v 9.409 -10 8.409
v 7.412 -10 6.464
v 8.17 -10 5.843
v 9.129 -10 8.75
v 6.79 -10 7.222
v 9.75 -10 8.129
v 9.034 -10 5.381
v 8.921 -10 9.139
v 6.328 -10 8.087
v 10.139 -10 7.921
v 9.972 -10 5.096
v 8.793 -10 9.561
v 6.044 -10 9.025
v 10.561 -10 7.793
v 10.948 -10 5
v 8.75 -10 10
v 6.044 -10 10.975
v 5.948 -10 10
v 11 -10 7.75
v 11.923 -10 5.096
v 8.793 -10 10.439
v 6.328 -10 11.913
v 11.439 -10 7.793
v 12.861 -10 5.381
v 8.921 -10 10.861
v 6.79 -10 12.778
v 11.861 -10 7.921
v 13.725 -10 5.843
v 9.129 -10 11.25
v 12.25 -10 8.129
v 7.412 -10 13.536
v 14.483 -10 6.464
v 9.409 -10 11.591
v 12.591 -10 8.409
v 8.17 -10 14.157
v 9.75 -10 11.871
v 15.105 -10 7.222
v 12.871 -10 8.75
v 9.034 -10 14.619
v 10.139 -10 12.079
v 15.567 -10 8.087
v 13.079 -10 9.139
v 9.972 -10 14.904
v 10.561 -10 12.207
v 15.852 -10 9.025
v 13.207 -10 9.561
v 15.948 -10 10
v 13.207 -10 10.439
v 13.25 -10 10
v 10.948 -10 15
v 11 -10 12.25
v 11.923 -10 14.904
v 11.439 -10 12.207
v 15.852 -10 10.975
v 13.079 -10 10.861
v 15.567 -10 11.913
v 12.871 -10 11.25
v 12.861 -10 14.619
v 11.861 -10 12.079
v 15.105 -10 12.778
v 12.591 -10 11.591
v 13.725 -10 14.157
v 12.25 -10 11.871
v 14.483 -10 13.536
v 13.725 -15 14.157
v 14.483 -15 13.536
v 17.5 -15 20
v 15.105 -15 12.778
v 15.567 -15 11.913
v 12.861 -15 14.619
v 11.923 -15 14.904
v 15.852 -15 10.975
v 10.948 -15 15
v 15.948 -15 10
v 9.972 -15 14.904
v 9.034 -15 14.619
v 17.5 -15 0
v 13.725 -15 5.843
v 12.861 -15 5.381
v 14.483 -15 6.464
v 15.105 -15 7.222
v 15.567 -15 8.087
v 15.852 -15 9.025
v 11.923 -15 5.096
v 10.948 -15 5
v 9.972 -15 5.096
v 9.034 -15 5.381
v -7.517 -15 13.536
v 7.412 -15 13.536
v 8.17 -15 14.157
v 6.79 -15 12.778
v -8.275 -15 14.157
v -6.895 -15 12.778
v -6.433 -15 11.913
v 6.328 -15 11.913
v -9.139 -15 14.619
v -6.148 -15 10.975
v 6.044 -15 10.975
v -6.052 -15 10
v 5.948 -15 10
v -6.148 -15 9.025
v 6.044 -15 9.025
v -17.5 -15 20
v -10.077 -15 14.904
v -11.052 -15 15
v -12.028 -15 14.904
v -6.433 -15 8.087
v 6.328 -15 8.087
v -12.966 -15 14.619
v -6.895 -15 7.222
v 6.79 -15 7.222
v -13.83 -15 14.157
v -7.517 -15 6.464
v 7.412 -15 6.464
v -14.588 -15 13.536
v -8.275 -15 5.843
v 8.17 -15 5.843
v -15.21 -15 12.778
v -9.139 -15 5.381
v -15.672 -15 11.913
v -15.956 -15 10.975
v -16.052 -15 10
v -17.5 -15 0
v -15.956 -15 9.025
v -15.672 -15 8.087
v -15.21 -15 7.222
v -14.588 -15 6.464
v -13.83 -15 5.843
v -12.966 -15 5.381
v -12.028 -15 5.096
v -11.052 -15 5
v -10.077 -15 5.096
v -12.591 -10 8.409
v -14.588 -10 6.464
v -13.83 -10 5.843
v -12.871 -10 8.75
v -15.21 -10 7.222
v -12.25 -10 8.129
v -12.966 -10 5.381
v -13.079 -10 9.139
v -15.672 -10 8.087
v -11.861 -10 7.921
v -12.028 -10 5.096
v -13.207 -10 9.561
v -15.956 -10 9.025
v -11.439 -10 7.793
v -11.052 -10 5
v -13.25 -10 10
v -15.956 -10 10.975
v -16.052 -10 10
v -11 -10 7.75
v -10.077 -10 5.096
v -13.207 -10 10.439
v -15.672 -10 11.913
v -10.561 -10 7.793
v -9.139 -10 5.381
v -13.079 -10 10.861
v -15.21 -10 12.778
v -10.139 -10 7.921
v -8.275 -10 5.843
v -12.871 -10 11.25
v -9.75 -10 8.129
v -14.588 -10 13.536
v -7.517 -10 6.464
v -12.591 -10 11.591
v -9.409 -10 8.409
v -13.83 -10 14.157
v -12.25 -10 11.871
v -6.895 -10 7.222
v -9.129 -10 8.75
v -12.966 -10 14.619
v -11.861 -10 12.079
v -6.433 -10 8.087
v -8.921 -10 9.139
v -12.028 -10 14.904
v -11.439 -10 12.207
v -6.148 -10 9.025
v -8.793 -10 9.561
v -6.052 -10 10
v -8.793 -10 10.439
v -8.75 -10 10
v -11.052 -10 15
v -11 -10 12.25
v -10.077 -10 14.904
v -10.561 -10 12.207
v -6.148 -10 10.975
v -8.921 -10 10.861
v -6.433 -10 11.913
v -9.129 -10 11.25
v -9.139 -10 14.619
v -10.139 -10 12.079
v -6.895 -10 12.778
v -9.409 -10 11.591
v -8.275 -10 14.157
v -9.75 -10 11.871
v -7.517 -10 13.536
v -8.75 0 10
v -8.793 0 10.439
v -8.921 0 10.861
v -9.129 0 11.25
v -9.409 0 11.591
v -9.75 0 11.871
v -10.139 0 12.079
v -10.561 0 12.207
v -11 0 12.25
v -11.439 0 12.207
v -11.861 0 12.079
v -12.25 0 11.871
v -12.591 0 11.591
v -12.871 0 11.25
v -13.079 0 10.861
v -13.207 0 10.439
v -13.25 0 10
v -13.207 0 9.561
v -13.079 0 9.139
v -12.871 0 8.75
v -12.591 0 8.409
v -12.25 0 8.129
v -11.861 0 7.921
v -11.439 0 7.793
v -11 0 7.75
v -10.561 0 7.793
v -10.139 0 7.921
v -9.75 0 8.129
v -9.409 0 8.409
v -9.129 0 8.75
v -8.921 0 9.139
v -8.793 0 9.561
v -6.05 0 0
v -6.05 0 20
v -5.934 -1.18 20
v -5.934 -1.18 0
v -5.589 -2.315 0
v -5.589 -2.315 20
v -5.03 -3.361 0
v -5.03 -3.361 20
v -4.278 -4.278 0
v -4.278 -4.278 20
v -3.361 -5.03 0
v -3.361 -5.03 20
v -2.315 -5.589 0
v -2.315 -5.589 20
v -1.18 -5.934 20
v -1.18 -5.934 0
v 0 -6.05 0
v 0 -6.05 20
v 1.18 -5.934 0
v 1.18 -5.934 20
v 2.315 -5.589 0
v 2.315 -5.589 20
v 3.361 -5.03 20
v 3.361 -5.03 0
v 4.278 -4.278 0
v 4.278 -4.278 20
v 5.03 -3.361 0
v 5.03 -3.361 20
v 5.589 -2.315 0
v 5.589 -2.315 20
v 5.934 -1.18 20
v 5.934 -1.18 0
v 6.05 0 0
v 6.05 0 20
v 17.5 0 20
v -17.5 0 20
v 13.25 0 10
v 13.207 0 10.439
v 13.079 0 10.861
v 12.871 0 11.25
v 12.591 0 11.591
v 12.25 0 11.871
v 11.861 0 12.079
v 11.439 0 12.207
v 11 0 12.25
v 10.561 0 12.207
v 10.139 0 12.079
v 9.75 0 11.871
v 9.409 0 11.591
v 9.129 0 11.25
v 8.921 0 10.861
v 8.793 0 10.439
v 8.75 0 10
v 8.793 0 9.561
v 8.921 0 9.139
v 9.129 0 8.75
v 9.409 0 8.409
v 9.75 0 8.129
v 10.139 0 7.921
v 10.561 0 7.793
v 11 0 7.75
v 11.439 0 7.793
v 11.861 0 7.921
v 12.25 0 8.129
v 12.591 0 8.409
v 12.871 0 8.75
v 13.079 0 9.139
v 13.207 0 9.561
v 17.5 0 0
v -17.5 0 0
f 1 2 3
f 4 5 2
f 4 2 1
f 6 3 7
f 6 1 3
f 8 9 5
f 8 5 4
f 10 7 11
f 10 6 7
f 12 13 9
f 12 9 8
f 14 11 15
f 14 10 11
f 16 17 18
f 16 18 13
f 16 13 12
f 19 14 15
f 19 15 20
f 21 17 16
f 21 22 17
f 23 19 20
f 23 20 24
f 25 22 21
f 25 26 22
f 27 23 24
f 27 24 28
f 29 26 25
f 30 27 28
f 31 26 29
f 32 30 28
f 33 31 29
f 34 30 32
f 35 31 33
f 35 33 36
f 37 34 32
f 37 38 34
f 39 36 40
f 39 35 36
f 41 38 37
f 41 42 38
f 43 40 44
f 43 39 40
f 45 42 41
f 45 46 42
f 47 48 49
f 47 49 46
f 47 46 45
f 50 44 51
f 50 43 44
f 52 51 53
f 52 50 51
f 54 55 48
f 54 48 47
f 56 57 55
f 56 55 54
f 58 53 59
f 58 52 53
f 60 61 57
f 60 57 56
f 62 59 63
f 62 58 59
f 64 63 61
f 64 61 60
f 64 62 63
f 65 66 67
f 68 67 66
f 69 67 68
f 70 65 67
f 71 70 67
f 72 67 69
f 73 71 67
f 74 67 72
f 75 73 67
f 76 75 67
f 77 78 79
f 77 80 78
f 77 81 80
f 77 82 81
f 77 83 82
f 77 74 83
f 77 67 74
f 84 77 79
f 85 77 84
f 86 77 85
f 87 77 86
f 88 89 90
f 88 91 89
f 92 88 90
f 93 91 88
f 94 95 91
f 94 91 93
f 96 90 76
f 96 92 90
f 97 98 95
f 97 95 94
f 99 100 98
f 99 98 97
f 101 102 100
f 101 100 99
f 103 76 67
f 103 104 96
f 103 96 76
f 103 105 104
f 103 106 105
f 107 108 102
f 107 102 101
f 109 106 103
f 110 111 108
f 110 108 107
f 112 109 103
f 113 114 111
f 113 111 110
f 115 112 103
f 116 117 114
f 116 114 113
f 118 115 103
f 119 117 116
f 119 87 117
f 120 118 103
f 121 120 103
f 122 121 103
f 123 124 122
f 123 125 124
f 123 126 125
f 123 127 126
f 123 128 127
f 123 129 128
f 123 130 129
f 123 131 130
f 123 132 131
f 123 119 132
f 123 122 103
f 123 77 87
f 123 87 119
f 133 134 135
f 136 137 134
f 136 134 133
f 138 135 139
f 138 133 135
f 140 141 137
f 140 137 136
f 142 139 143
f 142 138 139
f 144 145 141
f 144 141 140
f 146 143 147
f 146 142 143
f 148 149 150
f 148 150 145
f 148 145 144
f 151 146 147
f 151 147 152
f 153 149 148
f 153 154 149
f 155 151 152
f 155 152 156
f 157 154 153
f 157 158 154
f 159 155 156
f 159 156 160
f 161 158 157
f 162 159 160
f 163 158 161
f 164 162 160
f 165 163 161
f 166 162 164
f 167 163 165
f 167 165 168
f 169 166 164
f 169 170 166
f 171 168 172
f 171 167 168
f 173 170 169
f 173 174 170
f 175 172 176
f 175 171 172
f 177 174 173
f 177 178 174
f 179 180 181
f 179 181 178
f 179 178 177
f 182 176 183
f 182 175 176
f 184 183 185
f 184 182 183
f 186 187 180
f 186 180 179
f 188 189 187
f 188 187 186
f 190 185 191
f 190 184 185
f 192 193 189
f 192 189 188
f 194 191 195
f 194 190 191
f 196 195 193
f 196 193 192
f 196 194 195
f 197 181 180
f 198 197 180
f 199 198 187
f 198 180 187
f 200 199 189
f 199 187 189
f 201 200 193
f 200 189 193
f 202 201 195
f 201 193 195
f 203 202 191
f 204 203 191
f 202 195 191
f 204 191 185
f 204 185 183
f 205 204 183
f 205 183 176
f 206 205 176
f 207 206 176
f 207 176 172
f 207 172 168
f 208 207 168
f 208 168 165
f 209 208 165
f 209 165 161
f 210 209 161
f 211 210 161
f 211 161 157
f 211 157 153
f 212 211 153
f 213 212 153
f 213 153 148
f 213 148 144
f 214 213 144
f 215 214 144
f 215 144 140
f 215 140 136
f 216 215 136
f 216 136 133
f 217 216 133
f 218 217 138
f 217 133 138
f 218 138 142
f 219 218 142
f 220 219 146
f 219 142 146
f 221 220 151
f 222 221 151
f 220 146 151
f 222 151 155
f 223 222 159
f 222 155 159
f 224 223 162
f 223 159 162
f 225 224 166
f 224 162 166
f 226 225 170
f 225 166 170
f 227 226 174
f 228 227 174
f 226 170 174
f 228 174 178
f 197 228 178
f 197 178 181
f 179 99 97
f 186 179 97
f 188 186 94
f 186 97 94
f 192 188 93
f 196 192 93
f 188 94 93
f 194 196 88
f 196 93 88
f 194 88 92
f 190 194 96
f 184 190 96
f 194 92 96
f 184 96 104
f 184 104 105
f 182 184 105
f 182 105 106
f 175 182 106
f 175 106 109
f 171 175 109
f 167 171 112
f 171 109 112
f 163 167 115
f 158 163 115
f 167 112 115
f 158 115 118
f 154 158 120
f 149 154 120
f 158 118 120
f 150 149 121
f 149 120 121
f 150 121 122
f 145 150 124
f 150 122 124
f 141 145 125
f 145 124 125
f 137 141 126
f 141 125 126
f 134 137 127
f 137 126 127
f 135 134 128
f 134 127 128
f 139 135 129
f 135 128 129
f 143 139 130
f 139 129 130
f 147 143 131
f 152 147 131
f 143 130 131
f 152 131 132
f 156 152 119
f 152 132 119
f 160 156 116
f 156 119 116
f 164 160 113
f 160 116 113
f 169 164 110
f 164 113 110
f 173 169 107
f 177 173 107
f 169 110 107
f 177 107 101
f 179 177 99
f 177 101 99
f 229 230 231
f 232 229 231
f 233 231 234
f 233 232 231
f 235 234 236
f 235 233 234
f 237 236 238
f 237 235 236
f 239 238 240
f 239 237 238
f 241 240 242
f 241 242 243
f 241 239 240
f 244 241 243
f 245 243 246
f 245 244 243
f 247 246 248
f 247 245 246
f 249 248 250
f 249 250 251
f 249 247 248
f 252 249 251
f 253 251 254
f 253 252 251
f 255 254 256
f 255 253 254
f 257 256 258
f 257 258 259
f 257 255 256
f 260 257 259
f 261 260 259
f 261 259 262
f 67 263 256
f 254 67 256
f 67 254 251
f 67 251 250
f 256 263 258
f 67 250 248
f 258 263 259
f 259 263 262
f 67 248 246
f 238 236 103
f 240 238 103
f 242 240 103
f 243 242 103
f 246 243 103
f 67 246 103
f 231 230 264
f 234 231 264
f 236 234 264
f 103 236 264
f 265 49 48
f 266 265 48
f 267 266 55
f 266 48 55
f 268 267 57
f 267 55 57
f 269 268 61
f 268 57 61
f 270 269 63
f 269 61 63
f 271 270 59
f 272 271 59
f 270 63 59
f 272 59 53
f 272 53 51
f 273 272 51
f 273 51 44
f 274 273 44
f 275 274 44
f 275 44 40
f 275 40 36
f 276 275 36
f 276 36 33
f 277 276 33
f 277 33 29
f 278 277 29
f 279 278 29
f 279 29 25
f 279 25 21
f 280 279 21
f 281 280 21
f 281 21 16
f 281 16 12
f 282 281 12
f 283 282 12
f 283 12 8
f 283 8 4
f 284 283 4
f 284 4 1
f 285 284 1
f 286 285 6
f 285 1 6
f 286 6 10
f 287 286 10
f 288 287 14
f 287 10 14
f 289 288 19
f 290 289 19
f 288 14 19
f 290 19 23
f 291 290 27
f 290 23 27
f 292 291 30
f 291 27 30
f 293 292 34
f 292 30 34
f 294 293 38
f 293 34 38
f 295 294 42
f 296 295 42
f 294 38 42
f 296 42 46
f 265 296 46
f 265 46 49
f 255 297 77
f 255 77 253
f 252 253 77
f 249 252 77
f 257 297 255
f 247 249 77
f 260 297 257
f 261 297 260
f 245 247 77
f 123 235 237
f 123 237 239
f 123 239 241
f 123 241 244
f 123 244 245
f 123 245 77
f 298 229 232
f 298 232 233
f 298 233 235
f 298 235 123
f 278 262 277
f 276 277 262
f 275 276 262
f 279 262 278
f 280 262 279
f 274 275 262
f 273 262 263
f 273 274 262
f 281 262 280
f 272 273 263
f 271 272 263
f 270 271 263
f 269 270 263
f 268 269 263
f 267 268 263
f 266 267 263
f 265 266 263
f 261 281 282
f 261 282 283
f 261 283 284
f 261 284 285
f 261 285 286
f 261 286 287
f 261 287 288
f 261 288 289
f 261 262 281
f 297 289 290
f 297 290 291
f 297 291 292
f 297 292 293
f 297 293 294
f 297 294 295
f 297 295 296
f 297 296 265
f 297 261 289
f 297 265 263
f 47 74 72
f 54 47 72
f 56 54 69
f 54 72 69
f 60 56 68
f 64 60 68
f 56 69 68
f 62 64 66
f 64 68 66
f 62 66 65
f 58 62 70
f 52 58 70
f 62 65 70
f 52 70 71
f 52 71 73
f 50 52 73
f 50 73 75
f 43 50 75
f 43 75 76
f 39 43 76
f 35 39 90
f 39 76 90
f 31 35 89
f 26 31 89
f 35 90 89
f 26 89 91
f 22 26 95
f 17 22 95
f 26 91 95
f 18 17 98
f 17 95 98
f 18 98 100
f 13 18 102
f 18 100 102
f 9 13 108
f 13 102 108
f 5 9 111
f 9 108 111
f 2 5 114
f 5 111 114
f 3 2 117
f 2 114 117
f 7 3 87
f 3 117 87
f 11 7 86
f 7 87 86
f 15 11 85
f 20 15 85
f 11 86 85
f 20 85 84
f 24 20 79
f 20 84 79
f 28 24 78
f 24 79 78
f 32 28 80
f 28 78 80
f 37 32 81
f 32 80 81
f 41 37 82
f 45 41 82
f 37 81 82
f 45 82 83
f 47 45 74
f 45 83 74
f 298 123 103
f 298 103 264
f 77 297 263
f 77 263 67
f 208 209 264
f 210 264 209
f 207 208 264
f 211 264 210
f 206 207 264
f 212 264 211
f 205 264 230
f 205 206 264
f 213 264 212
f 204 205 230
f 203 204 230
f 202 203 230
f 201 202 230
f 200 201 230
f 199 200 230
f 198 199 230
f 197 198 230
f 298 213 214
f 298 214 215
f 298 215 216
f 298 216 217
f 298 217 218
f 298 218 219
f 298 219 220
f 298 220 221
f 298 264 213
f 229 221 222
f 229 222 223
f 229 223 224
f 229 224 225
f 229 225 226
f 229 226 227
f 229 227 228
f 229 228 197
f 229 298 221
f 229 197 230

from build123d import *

# Parameters (mm, degrees)
PAD_DEPTH       = 20
SKETCH001_R     = 2.25
POCKET_DEPTH    = 15.001
SKETCH002_R     = 5
POCKET001_DEPTH = 5


with BuildPart() as part:
    # Sketch → Pad (new body)
    with BuildSketch(Plane.XY):
        with BuildLine():
            ThreePointArc((-6.05, 0), (0, -6.05), (6.05, 0))
            Line((6.05, 0), (17.5, 0))
            Line((17.5, 0), (17.5, -15))
            Line((17.5, -15), (-17.5, -15))
            Line((-17.5, -15), (-17.5, 0))
            Line((-17.5, 0), (-6.05, 0))
        make_face()
    extrude(amount=PAD_DEPTH)

    # Sketch001 → Pocket (cut, through all)
    with BuildSketch(Plane.XZ.offset(15)):
        with Locations((-11, 10)):
            Circle(SKETCH001_R)
        with Locations((11, 10)):
            Circle(SKETCH001_R)
    extrude(amount=-POCKET_DEPTH, mode=Mode.SUBTRACT)

    # Sketch002 → Pocket001 (cut)
    with BuildSketch(Plane.XZ.offset(15)):
        with Locations((-11.052364, 10)):
            Circle(SKETCH002_R)
        with Locations((10.947636, 10)):
            Circle(SKETCH002_R)
    extrude(amount=-POCKET001_DEPTH, mode=Mode.SUBTRACT)


solid = part.part
